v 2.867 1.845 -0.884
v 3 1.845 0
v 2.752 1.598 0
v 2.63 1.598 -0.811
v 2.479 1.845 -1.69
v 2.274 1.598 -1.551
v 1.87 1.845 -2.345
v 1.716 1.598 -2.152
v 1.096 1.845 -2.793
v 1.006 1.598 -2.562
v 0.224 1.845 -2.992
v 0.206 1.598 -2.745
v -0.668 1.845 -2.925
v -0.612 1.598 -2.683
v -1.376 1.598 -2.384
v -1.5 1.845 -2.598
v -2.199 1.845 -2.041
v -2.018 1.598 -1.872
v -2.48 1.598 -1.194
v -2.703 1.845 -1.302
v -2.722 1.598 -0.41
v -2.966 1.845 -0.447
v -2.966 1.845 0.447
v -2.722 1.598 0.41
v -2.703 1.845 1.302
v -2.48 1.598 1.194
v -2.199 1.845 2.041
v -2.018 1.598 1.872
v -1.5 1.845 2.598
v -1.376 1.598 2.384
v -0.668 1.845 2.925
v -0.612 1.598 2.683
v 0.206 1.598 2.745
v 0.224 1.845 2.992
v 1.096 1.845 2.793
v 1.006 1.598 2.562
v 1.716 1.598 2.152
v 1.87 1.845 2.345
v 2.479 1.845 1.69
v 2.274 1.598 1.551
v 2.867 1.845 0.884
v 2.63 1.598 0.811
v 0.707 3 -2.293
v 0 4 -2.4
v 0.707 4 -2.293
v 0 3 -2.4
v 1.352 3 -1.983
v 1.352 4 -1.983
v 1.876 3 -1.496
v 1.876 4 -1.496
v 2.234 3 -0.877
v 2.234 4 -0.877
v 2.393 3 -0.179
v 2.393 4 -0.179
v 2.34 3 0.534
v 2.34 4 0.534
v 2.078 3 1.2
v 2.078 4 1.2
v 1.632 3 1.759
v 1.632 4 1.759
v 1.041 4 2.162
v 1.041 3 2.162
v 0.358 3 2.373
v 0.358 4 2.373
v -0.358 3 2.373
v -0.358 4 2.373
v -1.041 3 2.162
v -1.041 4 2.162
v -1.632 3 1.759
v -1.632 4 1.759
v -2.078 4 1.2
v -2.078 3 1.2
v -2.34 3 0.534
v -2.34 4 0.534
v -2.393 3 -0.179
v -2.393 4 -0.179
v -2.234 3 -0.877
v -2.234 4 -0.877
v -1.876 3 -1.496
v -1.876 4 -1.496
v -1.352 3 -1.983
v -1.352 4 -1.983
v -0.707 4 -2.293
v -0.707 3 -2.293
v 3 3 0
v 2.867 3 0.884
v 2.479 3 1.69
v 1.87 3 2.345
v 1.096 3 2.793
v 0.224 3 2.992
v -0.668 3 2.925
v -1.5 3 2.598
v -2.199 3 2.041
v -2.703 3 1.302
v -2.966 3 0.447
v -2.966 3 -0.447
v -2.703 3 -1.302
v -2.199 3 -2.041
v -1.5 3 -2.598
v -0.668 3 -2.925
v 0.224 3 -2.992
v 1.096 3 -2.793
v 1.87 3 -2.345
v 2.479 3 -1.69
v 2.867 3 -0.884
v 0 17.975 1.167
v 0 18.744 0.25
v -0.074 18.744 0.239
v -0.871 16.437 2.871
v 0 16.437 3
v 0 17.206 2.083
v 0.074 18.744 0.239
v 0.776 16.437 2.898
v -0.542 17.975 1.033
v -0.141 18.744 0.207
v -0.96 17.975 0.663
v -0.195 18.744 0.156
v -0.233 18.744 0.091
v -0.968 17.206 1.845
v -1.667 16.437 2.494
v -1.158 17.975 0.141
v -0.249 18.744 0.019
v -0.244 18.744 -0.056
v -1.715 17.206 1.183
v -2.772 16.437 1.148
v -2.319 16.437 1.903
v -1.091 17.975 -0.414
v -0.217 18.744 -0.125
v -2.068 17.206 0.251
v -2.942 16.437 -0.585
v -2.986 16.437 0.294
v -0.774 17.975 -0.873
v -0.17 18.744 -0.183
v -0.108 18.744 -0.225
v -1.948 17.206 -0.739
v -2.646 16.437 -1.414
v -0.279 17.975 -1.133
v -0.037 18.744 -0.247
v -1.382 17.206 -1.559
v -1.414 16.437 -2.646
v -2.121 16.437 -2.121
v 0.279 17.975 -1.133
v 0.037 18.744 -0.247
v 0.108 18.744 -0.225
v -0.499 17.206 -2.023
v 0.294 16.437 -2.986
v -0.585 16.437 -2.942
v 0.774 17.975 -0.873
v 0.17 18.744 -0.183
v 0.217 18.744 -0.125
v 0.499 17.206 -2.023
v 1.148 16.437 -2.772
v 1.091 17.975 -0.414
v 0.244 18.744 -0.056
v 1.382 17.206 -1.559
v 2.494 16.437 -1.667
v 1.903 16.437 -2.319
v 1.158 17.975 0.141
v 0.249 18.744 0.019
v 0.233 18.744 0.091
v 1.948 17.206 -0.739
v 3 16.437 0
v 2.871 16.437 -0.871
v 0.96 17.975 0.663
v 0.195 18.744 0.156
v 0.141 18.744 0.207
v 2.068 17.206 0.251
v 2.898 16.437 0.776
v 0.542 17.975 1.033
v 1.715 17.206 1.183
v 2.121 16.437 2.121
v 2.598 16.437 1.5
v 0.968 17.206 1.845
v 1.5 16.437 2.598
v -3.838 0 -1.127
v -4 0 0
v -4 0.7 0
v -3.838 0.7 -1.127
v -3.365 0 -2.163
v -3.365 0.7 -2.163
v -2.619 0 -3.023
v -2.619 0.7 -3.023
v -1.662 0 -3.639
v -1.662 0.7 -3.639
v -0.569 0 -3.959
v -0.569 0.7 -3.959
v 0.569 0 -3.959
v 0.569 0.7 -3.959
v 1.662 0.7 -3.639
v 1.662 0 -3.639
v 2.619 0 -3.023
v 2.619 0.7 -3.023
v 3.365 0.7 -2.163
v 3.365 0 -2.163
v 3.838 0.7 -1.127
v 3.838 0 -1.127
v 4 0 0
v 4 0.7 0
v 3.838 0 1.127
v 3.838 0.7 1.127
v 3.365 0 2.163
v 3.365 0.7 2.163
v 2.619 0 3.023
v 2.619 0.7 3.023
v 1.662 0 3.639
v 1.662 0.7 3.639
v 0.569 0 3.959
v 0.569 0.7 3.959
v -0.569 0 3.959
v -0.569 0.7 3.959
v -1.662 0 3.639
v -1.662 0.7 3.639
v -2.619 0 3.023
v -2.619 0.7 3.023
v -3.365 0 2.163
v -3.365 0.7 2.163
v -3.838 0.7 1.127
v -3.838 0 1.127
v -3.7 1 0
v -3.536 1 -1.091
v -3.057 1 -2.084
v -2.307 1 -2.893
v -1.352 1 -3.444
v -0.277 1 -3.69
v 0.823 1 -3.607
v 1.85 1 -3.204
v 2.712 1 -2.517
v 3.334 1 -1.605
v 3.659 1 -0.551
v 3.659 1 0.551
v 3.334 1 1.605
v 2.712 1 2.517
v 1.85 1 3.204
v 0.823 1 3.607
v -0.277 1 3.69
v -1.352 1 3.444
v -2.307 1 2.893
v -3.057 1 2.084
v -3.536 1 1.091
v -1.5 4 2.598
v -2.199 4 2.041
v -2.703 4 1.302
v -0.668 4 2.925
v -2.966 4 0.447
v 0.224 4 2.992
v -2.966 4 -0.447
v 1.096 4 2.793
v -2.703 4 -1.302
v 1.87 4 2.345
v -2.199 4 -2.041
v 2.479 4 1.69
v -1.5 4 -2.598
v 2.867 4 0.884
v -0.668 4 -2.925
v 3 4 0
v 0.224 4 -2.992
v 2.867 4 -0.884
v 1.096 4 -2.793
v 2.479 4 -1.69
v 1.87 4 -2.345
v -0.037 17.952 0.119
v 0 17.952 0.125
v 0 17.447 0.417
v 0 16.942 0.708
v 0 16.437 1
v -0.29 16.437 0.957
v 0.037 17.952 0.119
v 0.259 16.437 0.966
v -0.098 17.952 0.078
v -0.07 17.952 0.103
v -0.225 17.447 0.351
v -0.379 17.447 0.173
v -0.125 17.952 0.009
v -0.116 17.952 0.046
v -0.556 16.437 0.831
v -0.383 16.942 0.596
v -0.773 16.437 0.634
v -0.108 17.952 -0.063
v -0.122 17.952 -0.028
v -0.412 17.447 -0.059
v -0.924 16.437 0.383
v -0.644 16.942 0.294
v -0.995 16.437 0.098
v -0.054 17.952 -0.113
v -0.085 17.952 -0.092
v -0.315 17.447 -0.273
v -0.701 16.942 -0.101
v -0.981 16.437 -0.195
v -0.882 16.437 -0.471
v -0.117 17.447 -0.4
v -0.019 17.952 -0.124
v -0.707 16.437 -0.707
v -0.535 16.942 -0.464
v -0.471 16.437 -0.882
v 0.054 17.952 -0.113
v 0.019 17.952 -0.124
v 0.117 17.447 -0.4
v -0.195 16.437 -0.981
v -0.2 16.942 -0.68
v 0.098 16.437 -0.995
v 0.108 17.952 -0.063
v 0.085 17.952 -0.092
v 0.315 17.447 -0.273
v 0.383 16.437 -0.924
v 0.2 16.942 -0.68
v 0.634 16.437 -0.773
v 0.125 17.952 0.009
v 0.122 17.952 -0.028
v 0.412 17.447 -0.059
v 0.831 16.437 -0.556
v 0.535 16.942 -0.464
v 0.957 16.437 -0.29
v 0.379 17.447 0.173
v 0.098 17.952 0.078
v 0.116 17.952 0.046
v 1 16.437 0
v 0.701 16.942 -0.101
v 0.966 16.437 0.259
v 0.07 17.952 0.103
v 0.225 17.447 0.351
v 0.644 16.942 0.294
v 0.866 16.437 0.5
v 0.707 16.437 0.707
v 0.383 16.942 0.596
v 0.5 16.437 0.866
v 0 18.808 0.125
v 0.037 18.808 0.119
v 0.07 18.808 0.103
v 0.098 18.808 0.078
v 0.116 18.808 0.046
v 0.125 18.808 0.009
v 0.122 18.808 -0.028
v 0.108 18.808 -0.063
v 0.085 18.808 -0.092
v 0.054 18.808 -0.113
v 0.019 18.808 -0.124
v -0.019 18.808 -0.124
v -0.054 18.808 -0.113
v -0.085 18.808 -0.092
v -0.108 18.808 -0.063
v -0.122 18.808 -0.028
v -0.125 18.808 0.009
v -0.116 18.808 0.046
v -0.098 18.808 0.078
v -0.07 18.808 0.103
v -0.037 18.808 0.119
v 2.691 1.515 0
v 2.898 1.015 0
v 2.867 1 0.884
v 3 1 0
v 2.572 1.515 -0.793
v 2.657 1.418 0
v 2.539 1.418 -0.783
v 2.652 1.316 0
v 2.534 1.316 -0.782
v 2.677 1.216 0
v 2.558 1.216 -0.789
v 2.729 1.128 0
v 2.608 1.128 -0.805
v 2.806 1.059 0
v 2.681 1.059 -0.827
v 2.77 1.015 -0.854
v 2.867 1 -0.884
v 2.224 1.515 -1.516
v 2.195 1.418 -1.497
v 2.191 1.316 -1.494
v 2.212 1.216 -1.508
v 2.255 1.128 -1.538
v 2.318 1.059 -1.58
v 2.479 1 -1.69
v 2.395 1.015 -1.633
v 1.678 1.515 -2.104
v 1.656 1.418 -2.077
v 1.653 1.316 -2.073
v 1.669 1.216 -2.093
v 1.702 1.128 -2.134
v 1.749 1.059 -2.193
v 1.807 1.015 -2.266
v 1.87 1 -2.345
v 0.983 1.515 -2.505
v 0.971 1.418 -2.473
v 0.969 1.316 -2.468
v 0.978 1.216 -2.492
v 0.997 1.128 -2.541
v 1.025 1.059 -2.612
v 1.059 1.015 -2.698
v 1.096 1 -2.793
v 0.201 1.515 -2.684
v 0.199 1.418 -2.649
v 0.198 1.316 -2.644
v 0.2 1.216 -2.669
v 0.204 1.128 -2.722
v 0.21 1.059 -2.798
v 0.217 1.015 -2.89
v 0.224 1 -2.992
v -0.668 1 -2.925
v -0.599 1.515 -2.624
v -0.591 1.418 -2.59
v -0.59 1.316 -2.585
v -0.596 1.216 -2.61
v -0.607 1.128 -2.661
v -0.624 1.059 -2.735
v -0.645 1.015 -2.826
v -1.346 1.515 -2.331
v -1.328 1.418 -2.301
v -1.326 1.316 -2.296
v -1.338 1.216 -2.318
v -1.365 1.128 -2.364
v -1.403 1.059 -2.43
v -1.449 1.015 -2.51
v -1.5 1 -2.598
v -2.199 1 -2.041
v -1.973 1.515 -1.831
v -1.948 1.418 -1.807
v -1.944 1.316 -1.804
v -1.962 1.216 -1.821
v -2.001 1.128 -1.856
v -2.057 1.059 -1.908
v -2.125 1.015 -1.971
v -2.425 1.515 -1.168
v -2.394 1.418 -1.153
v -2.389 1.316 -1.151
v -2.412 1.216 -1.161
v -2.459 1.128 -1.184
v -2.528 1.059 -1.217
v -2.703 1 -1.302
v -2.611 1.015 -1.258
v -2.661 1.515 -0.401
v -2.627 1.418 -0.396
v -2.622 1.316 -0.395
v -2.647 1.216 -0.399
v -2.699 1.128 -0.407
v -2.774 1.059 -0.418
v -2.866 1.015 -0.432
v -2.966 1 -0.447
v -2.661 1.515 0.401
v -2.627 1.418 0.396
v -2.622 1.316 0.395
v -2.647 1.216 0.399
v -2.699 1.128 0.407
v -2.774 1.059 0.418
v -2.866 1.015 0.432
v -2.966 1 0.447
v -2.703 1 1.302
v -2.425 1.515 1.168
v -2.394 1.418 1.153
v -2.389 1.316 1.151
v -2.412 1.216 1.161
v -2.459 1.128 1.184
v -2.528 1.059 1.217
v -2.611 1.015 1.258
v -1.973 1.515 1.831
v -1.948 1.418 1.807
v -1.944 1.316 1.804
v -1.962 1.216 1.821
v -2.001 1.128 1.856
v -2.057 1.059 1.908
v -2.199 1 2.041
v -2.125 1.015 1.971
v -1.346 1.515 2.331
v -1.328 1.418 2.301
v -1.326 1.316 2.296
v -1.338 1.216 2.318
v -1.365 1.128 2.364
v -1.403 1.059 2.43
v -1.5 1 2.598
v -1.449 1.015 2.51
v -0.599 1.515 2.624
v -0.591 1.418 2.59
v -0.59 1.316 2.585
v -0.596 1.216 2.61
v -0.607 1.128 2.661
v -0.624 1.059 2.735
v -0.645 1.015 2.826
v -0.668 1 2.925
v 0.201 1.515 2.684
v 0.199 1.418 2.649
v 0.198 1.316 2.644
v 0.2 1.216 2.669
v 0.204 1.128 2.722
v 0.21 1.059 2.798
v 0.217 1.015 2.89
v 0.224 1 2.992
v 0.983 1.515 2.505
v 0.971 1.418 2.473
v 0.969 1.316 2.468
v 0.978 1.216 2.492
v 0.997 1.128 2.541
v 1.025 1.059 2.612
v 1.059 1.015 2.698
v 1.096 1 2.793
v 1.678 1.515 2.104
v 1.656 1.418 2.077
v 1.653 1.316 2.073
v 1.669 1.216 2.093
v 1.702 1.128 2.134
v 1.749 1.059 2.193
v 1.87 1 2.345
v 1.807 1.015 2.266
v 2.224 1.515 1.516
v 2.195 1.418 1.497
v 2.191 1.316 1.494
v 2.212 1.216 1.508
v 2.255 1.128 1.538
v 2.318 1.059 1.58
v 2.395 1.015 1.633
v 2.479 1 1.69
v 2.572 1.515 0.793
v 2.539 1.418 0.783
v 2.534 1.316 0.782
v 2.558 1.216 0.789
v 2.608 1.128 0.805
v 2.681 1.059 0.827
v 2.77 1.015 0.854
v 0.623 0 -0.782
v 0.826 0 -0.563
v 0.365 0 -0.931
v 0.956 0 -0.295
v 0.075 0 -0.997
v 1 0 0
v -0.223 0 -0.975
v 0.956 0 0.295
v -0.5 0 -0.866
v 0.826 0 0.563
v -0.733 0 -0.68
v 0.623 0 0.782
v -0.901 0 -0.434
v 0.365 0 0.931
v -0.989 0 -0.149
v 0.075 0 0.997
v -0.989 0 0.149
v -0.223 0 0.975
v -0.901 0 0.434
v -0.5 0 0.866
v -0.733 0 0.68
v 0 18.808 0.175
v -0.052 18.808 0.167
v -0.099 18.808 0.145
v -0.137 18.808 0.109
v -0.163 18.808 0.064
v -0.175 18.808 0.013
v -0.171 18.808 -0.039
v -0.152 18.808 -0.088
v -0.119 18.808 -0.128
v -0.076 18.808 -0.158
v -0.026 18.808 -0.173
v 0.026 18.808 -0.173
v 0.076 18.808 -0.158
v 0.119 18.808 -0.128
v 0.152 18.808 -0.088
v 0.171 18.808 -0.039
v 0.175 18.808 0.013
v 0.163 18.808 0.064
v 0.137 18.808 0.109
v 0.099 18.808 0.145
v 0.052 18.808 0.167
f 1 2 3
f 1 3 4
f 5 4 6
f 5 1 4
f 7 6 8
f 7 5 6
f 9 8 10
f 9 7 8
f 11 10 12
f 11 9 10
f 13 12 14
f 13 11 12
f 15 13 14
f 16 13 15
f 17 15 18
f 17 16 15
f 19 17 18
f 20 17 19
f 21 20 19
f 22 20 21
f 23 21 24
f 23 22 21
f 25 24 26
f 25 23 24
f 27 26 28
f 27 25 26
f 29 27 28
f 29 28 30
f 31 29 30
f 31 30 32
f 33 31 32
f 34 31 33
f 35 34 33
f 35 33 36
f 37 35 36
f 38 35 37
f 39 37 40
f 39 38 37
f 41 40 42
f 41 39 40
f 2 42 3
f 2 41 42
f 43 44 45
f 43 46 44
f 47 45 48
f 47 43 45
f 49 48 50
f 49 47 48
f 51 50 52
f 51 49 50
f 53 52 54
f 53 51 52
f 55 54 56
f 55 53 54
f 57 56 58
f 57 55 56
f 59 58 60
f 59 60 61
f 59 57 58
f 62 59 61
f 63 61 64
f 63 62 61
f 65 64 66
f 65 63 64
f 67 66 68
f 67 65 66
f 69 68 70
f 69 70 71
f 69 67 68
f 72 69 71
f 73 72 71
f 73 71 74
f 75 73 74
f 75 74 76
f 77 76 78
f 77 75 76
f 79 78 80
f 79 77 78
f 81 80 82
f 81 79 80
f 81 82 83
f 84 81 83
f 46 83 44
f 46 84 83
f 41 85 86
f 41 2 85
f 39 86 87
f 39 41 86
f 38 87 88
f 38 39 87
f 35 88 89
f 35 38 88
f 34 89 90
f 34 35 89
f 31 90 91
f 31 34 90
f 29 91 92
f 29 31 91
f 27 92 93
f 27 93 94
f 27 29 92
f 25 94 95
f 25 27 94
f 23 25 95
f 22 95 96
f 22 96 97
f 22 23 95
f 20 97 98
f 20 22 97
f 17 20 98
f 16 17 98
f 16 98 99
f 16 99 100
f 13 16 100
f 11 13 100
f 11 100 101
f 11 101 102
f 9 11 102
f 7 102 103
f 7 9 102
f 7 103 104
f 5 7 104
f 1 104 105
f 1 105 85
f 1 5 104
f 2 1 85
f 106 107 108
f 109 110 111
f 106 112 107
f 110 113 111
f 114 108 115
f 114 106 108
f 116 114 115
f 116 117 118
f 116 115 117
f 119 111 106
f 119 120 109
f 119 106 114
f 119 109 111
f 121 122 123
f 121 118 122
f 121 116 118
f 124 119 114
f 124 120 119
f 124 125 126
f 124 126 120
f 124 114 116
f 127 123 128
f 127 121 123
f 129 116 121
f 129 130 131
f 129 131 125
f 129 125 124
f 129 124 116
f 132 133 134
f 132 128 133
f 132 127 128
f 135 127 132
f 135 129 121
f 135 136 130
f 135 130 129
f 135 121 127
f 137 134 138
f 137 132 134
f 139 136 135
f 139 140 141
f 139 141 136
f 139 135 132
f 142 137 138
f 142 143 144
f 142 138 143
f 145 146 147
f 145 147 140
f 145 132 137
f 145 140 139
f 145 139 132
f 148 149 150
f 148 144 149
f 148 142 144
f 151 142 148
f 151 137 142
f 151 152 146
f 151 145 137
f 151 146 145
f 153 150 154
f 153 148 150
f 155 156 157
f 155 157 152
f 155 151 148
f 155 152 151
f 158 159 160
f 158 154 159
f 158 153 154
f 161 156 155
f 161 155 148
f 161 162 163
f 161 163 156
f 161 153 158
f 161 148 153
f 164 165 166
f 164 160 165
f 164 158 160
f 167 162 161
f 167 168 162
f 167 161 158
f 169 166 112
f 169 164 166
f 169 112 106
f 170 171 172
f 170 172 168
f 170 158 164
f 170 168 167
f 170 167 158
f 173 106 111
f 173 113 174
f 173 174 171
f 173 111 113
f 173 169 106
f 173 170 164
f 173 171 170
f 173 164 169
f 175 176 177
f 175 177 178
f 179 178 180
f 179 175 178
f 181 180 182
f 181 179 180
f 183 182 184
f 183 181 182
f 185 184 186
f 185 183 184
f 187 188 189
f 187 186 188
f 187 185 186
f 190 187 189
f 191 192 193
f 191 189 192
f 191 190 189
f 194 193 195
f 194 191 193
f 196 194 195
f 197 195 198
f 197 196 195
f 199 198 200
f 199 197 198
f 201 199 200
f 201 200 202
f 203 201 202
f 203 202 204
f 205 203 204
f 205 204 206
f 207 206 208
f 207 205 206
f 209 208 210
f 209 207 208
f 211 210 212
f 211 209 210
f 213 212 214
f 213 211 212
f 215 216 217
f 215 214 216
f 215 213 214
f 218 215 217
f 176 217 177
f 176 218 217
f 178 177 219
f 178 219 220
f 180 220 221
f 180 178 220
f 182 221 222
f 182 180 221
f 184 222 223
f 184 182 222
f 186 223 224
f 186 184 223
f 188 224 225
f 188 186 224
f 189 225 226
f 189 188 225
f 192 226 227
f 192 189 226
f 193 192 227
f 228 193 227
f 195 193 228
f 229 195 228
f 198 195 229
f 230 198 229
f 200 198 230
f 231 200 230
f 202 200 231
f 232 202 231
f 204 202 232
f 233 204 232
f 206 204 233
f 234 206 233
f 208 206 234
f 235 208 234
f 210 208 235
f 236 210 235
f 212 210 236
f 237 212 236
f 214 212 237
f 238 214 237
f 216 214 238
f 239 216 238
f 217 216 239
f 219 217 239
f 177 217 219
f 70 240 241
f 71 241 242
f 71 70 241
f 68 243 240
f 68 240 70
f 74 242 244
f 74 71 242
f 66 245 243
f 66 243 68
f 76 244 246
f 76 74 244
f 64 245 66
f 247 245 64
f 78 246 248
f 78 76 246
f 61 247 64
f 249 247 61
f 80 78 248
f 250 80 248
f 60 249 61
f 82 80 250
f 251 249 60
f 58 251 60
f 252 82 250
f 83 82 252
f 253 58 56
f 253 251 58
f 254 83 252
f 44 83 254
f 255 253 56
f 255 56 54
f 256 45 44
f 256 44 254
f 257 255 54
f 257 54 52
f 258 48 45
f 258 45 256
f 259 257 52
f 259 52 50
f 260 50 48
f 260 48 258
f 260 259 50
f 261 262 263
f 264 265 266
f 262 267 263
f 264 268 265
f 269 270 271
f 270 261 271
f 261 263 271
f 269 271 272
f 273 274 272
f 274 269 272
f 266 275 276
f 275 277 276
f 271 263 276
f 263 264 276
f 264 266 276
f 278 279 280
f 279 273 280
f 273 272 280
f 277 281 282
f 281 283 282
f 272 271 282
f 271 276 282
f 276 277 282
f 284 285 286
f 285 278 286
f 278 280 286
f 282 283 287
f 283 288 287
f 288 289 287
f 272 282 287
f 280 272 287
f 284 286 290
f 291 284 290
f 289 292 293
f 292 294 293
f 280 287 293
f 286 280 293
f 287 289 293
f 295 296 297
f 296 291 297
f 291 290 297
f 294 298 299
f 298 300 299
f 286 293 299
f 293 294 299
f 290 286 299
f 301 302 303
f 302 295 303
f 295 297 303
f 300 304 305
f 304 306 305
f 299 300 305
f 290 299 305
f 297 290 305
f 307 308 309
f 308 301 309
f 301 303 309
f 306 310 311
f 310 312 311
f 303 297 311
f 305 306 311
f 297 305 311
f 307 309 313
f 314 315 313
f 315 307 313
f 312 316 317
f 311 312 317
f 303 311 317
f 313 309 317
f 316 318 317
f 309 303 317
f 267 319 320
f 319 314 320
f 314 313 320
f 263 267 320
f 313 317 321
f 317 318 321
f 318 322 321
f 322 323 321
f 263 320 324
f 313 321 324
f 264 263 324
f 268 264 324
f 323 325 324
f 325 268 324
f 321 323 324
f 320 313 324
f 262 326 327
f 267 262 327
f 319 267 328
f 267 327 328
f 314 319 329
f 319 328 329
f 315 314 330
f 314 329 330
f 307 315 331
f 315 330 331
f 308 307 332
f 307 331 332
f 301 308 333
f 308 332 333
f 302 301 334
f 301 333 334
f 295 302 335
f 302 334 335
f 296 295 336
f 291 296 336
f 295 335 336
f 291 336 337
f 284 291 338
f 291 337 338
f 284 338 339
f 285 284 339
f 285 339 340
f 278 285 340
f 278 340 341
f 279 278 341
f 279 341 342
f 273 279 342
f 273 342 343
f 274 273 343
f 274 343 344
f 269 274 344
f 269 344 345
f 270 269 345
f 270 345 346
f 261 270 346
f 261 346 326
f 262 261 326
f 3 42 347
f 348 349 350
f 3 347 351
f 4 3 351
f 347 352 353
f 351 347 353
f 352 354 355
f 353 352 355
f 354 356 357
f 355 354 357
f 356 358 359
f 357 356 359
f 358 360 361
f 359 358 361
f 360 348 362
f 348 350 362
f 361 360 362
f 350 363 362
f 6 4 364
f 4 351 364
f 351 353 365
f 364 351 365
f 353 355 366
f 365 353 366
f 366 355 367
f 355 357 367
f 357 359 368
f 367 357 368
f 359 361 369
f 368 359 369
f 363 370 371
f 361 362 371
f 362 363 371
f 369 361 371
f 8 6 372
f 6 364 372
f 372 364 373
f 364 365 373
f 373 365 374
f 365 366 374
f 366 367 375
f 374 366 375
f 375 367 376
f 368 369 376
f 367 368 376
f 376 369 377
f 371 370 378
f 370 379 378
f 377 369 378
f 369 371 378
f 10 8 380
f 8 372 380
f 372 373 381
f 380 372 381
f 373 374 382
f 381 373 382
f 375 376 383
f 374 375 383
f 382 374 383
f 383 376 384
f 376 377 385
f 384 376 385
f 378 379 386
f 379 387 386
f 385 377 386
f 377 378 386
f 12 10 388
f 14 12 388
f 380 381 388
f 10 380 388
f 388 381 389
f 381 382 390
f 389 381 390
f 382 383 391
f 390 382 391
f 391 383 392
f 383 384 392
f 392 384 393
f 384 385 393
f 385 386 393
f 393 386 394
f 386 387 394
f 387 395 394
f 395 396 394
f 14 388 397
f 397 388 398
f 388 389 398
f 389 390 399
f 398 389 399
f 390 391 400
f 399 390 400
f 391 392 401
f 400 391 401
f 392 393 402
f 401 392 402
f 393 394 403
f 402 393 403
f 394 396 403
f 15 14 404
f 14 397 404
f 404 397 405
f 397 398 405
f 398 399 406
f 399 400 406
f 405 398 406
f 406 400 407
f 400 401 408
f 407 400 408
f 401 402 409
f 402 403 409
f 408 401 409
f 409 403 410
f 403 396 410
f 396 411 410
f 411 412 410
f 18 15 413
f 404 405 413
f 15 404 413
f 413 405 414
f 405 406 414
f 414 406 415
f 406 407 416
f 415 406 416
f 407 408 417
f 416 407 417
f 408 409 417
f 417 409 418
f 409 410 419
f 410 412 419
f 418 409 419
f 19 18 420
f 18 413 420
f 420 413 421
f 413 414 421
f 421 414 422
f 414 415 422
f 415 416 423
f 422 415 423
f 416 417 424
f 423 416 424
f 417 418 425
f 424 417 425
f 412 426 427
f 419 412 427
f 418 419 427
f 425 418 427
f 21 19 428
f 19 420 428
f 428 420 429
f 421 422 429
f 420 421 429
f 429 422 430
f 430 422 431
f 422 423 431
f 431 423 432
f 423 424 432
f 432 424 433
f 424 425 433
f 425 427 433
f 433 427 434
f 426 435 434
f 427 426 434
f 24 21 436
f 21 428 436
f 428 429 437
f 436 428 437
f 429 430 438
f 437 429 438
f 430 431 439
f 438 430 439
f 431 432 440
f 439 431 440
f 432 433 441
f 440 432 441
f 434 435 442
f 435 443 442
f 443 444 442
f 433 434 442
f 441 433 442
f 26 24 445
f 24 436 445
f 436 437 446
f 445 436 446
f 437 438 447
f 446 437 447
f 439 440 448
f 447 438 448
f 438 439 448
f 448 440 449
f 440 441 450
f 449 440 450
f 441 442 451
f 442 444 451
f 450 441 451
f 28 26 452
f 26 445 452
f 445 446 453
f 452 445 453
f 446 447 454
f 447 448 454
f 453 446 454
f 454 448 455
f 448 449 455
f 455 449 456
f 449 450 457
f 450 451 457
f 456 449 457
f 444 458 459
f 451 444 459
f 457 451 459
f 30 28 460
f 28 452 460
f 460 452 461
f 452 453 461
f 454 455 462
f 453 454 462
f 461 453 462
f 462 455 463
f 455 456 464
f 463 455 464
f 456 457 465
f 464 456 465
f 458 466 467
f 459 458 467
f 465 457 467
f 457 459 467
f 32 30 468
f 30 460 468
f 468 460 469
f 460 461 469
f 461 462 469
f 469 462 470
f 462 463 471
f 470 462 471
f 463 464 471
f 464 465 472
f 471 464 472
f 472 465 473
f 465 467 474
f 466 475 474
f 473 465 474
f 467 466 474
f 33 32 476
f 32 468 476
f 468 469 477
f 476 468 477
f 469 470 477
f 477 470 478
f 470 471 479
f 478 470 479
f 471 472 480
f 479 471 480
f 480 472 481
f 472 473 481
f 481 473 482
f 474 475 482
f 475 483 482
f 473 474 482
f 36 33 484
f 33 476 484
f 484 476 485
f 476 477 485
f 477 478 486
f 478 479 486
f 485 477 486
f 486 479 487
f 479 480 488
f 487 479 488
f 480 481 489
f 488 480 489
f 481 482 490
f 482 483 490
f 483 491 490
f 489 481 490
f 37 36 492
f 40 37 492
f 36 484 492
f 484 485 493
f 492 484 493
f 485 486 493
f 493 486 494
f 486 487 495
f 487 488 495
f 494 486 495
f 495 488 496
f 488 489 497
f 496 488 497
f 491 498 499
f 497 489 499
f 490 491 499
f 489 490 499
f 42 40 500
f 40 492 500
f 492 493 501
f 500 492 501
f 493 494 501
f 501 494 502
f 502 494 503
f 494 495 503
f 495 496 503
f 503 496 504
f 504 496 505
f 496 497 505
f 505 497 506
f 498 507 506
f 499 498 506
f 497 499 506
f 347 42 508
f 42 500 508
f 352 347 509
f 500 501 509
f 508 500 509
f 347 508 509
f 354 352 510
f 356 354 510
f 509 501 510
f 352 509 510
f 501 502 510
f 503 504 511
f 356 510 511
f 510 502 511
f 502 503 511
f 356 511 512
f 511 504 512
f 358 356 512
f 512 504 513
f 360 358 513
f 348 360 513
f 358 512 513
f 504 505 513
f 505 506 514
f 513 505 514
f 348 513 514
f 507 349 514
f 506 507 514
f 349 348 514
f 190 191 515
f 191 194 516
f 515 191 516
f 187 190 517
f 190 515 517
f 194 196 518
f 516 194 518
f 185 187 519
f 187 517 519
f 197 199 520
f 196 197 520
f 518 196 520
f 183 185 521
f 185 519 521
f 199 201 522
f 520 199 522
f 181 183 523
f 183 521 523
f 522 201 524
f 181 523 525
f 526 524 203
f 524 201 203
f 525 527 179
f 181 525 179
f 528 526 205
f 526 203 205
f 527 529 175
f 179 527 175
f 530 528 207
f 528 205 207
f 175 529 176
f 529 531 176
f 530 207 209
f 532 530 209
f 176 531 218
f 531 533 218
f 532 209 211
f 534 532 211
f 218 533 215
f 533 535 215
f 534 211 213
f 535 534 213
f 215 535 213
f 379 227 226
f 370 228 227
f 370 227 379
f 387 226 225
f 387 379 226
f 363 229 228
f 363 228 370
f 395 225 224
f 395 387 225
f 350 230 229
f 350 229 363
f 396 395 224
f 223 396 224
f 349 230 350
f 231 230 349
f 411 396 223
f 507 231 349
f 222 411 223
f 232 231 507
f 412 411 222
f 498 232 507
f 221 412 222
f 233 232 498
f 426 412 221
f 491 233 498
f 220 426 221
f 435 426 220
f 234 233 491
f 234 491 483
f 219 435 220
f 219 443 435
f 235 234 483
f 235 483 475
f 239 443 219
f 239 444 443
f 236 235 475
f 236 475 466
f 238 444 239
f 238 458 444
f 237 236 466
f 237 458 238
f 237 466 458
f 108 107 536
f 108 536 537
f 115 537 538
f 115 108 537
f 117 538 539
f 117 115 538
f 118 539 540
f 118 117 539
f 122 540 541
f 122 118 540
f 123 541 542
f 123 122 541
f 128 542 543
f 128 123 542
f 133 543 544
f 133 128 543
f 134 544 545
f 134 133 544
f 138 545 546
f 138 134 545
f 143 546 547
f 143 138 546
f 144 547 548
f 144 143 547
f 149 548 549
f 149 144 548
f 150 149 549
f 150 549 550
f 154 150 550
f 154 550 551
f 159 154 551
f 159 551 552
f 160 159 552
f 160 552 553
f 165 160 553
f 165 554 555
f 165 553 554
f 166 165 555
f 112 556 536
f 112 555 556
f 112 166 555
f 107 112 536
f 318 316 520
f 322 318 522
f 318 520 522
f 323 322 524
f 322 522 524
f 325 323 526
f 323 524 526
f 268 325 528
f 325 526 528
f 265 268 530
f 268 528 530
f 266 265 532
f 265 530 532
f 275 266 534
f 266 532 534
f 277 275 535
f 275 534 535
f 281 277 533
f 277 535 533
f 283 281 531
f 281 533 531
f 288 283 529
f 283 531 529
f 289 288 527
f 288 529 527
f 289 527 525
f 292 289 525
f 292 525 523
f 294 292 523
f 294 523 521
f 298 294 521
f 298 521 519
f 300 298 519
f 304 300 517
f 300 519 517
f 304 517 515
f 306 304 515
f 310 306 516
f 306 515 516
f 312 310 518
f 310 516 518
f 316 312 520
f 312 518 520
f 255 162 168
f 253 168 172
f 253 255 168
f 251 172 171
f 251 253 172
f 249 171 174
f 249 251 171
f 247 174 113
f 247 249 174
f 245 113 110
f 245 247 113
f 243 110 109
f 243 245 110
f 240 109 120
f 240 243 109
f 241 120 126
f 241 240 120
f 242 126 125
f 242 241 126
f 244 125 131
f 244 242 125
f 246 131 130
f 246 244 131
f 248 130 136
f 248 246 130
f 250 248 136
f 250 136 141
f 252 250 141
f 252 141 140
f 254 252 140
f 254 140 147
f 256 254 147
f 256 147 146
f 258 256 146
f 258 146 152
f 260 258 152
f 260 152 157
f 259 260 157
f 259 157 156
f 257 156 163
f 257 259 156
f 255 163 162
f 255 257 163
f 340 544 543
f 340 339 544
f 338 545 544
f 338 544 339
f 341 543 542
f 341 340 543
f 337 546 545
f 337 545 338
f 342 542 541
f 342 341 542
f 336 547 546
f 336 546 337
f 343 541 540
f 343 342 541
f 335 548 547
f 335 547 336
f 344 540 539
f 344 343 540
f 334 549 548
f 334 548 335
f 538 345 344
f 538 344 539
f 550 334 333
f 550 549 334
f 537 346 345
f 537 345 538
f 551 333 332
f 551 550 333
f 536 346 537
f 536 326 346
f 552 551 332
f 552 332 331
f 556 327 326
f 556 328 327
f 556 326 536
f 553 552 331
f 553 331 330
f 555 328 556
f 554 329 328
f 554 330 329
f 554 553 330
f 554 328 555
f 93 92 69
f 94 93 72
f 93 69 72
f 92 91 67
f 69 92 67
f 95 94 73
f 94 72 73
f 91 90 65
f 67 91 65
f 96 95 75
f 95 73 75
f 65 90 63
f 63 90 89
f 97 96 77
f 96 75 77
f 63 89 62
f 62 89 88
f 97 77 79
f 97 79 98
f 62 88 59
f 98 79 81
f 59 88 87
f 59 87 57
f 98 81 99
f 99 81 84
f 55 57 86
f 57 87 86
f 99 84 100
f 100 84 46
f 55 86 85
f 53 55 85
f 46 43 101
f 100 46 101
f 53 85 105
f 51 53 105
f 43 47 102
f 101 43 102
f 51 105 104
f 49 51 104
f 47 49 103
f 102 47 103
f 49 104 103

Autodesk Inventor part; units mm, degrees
ref_plane "XZ Plane" through (0, 0, 0) normal (0, 1, 0) x (-1, 0, 0)
sketch "Sketch1" plane through (0, 0, 0) normal (0, 1, 0) x (-1, 0, 0)
  circle A0 centre (0, 0) radius 4
  dimension "d0" = 8
extrude "Extrusion1" add sketch "Sketch1" along normal blind 1
sketch "Sketch2" plane through (0, 1, 0) normal (0, 1, 0) x (1, 0, 0)
  circle A0 centre (0, 0) radius 4 projected
  circle A1 centre (0, 0) radius 3
  dimension "d3" = 6
extrude "Extrusion2" add sketch "Sketch2" along normal blind 15.437 contours A1
sketch "Sketch3" plane through (0, 0, 0) normal (0, -1, 0) x (1, 0, 0)
  circle A0 centre (0, 0) radius 4 projected
  circle A1 centre (0, 0) radius 1
  dimension "d6" = 2
extrude "Extrusion3" cut sketch "Sketch3" against normal blind 21 contours A1
sketch "Sketch4" plane through (0, 0, 0) normal (1, 0, 0) x (0, 1, 0)
  line L0 (1, 3) -> (16.437, 3) projected
  line L1 (1, -3) -> (16.437, -3) projected
  line L2 (0, 0) -> (17, 0)
  line L3 (16.437, 3) -> (18.7445, 0.25)
  line L4 (16.437, -3) -> (16.437, 3) projected
  line L5 (16.437, 0.2) -> (17.8226, 0.2)
  line L6 (17.8226, 0.2) -> (16.437, 1)
  line L7 (0, 1) -> (16.437, 1) projected
  line L8 (16.437, 1) -> (16.437, 3)
  line L9 (17.9525, 0.125) -> (18.8075, 0.125)
  line L10 (17.8226, 0.2) -> (17.9525, 0.125)
  line L11 (18.7445, 0.25) -> (18.8075, 0.175)
  line L12 (18.8075, 0.125) -> (18.8075, 0.175)
  dimension "d9" = 40
  dimension "d10" = 0.2
  dimension "d11" = 30
  dimension "d21" = 0.125
  dimension "d22" = 0.05
revolve "Revolution1" add sketch "Sketch4" angle 360 about axis through (0, 0, 0) along (0, 1, 0) contours L3 L11 L12 L9 L10 L6 L4
sketch "Sketch5" plane through (0, 0, 0) normal (0, 0, 1) x (1, 0, 0)
  circle A0 centre (3, 1.35) radius 0.35
  line L0 (4, 1) -> (-4, 1) projected
  line L1 (3, 3) -> (3, 0)
  line L2 (0, 1.1204) -> (0, 3)
  line L3 (2.7525, 1.5975) -> (3.3734, 2.2184)
  line L4 (3.3734, 2.2184) -> (3.3499, 1.3406)
  point P0 (0, 0)
  dimension "d14" = 0.7
  dimension "d19" = 45
revolve "Revolution2" cut sketch "Sketch5" angle 360 about axis through (0, 1.1204, 0) along (0, 1, 0)
chamfer "Chamfer1" distance 0.3 angle 45 1 edges at (4, 1, 0)
sketch "Sketch6" plane through (0, 0, 0) normal (1, 0, 0) x (0, 1, 0)
  line L0 (1.845, -3) -> (16.437, -3) projected
  line L1 (3, -3) -> (4, -3)
  line L2 (4, -3) -> (4, -2.4)
  line L3 (4, -2.4) -> (3, -2.4)
  line L4 (3, -2.4) -> (3, -3)
  line L5 (0, 4) -> (0, -4) projected
  line L6 (0, 0) -> (-1.7649, 0)
  dimension "d23" = 1
  dimension "d24" = 0.6
  dimension "d25" = 3
revolve "Revolution3" cut sketch "Sketch6" angle 360 about axis through (0, 0, 0) along (0, -1, 0)
properties part number "nozzle0.25" material "Copper"
